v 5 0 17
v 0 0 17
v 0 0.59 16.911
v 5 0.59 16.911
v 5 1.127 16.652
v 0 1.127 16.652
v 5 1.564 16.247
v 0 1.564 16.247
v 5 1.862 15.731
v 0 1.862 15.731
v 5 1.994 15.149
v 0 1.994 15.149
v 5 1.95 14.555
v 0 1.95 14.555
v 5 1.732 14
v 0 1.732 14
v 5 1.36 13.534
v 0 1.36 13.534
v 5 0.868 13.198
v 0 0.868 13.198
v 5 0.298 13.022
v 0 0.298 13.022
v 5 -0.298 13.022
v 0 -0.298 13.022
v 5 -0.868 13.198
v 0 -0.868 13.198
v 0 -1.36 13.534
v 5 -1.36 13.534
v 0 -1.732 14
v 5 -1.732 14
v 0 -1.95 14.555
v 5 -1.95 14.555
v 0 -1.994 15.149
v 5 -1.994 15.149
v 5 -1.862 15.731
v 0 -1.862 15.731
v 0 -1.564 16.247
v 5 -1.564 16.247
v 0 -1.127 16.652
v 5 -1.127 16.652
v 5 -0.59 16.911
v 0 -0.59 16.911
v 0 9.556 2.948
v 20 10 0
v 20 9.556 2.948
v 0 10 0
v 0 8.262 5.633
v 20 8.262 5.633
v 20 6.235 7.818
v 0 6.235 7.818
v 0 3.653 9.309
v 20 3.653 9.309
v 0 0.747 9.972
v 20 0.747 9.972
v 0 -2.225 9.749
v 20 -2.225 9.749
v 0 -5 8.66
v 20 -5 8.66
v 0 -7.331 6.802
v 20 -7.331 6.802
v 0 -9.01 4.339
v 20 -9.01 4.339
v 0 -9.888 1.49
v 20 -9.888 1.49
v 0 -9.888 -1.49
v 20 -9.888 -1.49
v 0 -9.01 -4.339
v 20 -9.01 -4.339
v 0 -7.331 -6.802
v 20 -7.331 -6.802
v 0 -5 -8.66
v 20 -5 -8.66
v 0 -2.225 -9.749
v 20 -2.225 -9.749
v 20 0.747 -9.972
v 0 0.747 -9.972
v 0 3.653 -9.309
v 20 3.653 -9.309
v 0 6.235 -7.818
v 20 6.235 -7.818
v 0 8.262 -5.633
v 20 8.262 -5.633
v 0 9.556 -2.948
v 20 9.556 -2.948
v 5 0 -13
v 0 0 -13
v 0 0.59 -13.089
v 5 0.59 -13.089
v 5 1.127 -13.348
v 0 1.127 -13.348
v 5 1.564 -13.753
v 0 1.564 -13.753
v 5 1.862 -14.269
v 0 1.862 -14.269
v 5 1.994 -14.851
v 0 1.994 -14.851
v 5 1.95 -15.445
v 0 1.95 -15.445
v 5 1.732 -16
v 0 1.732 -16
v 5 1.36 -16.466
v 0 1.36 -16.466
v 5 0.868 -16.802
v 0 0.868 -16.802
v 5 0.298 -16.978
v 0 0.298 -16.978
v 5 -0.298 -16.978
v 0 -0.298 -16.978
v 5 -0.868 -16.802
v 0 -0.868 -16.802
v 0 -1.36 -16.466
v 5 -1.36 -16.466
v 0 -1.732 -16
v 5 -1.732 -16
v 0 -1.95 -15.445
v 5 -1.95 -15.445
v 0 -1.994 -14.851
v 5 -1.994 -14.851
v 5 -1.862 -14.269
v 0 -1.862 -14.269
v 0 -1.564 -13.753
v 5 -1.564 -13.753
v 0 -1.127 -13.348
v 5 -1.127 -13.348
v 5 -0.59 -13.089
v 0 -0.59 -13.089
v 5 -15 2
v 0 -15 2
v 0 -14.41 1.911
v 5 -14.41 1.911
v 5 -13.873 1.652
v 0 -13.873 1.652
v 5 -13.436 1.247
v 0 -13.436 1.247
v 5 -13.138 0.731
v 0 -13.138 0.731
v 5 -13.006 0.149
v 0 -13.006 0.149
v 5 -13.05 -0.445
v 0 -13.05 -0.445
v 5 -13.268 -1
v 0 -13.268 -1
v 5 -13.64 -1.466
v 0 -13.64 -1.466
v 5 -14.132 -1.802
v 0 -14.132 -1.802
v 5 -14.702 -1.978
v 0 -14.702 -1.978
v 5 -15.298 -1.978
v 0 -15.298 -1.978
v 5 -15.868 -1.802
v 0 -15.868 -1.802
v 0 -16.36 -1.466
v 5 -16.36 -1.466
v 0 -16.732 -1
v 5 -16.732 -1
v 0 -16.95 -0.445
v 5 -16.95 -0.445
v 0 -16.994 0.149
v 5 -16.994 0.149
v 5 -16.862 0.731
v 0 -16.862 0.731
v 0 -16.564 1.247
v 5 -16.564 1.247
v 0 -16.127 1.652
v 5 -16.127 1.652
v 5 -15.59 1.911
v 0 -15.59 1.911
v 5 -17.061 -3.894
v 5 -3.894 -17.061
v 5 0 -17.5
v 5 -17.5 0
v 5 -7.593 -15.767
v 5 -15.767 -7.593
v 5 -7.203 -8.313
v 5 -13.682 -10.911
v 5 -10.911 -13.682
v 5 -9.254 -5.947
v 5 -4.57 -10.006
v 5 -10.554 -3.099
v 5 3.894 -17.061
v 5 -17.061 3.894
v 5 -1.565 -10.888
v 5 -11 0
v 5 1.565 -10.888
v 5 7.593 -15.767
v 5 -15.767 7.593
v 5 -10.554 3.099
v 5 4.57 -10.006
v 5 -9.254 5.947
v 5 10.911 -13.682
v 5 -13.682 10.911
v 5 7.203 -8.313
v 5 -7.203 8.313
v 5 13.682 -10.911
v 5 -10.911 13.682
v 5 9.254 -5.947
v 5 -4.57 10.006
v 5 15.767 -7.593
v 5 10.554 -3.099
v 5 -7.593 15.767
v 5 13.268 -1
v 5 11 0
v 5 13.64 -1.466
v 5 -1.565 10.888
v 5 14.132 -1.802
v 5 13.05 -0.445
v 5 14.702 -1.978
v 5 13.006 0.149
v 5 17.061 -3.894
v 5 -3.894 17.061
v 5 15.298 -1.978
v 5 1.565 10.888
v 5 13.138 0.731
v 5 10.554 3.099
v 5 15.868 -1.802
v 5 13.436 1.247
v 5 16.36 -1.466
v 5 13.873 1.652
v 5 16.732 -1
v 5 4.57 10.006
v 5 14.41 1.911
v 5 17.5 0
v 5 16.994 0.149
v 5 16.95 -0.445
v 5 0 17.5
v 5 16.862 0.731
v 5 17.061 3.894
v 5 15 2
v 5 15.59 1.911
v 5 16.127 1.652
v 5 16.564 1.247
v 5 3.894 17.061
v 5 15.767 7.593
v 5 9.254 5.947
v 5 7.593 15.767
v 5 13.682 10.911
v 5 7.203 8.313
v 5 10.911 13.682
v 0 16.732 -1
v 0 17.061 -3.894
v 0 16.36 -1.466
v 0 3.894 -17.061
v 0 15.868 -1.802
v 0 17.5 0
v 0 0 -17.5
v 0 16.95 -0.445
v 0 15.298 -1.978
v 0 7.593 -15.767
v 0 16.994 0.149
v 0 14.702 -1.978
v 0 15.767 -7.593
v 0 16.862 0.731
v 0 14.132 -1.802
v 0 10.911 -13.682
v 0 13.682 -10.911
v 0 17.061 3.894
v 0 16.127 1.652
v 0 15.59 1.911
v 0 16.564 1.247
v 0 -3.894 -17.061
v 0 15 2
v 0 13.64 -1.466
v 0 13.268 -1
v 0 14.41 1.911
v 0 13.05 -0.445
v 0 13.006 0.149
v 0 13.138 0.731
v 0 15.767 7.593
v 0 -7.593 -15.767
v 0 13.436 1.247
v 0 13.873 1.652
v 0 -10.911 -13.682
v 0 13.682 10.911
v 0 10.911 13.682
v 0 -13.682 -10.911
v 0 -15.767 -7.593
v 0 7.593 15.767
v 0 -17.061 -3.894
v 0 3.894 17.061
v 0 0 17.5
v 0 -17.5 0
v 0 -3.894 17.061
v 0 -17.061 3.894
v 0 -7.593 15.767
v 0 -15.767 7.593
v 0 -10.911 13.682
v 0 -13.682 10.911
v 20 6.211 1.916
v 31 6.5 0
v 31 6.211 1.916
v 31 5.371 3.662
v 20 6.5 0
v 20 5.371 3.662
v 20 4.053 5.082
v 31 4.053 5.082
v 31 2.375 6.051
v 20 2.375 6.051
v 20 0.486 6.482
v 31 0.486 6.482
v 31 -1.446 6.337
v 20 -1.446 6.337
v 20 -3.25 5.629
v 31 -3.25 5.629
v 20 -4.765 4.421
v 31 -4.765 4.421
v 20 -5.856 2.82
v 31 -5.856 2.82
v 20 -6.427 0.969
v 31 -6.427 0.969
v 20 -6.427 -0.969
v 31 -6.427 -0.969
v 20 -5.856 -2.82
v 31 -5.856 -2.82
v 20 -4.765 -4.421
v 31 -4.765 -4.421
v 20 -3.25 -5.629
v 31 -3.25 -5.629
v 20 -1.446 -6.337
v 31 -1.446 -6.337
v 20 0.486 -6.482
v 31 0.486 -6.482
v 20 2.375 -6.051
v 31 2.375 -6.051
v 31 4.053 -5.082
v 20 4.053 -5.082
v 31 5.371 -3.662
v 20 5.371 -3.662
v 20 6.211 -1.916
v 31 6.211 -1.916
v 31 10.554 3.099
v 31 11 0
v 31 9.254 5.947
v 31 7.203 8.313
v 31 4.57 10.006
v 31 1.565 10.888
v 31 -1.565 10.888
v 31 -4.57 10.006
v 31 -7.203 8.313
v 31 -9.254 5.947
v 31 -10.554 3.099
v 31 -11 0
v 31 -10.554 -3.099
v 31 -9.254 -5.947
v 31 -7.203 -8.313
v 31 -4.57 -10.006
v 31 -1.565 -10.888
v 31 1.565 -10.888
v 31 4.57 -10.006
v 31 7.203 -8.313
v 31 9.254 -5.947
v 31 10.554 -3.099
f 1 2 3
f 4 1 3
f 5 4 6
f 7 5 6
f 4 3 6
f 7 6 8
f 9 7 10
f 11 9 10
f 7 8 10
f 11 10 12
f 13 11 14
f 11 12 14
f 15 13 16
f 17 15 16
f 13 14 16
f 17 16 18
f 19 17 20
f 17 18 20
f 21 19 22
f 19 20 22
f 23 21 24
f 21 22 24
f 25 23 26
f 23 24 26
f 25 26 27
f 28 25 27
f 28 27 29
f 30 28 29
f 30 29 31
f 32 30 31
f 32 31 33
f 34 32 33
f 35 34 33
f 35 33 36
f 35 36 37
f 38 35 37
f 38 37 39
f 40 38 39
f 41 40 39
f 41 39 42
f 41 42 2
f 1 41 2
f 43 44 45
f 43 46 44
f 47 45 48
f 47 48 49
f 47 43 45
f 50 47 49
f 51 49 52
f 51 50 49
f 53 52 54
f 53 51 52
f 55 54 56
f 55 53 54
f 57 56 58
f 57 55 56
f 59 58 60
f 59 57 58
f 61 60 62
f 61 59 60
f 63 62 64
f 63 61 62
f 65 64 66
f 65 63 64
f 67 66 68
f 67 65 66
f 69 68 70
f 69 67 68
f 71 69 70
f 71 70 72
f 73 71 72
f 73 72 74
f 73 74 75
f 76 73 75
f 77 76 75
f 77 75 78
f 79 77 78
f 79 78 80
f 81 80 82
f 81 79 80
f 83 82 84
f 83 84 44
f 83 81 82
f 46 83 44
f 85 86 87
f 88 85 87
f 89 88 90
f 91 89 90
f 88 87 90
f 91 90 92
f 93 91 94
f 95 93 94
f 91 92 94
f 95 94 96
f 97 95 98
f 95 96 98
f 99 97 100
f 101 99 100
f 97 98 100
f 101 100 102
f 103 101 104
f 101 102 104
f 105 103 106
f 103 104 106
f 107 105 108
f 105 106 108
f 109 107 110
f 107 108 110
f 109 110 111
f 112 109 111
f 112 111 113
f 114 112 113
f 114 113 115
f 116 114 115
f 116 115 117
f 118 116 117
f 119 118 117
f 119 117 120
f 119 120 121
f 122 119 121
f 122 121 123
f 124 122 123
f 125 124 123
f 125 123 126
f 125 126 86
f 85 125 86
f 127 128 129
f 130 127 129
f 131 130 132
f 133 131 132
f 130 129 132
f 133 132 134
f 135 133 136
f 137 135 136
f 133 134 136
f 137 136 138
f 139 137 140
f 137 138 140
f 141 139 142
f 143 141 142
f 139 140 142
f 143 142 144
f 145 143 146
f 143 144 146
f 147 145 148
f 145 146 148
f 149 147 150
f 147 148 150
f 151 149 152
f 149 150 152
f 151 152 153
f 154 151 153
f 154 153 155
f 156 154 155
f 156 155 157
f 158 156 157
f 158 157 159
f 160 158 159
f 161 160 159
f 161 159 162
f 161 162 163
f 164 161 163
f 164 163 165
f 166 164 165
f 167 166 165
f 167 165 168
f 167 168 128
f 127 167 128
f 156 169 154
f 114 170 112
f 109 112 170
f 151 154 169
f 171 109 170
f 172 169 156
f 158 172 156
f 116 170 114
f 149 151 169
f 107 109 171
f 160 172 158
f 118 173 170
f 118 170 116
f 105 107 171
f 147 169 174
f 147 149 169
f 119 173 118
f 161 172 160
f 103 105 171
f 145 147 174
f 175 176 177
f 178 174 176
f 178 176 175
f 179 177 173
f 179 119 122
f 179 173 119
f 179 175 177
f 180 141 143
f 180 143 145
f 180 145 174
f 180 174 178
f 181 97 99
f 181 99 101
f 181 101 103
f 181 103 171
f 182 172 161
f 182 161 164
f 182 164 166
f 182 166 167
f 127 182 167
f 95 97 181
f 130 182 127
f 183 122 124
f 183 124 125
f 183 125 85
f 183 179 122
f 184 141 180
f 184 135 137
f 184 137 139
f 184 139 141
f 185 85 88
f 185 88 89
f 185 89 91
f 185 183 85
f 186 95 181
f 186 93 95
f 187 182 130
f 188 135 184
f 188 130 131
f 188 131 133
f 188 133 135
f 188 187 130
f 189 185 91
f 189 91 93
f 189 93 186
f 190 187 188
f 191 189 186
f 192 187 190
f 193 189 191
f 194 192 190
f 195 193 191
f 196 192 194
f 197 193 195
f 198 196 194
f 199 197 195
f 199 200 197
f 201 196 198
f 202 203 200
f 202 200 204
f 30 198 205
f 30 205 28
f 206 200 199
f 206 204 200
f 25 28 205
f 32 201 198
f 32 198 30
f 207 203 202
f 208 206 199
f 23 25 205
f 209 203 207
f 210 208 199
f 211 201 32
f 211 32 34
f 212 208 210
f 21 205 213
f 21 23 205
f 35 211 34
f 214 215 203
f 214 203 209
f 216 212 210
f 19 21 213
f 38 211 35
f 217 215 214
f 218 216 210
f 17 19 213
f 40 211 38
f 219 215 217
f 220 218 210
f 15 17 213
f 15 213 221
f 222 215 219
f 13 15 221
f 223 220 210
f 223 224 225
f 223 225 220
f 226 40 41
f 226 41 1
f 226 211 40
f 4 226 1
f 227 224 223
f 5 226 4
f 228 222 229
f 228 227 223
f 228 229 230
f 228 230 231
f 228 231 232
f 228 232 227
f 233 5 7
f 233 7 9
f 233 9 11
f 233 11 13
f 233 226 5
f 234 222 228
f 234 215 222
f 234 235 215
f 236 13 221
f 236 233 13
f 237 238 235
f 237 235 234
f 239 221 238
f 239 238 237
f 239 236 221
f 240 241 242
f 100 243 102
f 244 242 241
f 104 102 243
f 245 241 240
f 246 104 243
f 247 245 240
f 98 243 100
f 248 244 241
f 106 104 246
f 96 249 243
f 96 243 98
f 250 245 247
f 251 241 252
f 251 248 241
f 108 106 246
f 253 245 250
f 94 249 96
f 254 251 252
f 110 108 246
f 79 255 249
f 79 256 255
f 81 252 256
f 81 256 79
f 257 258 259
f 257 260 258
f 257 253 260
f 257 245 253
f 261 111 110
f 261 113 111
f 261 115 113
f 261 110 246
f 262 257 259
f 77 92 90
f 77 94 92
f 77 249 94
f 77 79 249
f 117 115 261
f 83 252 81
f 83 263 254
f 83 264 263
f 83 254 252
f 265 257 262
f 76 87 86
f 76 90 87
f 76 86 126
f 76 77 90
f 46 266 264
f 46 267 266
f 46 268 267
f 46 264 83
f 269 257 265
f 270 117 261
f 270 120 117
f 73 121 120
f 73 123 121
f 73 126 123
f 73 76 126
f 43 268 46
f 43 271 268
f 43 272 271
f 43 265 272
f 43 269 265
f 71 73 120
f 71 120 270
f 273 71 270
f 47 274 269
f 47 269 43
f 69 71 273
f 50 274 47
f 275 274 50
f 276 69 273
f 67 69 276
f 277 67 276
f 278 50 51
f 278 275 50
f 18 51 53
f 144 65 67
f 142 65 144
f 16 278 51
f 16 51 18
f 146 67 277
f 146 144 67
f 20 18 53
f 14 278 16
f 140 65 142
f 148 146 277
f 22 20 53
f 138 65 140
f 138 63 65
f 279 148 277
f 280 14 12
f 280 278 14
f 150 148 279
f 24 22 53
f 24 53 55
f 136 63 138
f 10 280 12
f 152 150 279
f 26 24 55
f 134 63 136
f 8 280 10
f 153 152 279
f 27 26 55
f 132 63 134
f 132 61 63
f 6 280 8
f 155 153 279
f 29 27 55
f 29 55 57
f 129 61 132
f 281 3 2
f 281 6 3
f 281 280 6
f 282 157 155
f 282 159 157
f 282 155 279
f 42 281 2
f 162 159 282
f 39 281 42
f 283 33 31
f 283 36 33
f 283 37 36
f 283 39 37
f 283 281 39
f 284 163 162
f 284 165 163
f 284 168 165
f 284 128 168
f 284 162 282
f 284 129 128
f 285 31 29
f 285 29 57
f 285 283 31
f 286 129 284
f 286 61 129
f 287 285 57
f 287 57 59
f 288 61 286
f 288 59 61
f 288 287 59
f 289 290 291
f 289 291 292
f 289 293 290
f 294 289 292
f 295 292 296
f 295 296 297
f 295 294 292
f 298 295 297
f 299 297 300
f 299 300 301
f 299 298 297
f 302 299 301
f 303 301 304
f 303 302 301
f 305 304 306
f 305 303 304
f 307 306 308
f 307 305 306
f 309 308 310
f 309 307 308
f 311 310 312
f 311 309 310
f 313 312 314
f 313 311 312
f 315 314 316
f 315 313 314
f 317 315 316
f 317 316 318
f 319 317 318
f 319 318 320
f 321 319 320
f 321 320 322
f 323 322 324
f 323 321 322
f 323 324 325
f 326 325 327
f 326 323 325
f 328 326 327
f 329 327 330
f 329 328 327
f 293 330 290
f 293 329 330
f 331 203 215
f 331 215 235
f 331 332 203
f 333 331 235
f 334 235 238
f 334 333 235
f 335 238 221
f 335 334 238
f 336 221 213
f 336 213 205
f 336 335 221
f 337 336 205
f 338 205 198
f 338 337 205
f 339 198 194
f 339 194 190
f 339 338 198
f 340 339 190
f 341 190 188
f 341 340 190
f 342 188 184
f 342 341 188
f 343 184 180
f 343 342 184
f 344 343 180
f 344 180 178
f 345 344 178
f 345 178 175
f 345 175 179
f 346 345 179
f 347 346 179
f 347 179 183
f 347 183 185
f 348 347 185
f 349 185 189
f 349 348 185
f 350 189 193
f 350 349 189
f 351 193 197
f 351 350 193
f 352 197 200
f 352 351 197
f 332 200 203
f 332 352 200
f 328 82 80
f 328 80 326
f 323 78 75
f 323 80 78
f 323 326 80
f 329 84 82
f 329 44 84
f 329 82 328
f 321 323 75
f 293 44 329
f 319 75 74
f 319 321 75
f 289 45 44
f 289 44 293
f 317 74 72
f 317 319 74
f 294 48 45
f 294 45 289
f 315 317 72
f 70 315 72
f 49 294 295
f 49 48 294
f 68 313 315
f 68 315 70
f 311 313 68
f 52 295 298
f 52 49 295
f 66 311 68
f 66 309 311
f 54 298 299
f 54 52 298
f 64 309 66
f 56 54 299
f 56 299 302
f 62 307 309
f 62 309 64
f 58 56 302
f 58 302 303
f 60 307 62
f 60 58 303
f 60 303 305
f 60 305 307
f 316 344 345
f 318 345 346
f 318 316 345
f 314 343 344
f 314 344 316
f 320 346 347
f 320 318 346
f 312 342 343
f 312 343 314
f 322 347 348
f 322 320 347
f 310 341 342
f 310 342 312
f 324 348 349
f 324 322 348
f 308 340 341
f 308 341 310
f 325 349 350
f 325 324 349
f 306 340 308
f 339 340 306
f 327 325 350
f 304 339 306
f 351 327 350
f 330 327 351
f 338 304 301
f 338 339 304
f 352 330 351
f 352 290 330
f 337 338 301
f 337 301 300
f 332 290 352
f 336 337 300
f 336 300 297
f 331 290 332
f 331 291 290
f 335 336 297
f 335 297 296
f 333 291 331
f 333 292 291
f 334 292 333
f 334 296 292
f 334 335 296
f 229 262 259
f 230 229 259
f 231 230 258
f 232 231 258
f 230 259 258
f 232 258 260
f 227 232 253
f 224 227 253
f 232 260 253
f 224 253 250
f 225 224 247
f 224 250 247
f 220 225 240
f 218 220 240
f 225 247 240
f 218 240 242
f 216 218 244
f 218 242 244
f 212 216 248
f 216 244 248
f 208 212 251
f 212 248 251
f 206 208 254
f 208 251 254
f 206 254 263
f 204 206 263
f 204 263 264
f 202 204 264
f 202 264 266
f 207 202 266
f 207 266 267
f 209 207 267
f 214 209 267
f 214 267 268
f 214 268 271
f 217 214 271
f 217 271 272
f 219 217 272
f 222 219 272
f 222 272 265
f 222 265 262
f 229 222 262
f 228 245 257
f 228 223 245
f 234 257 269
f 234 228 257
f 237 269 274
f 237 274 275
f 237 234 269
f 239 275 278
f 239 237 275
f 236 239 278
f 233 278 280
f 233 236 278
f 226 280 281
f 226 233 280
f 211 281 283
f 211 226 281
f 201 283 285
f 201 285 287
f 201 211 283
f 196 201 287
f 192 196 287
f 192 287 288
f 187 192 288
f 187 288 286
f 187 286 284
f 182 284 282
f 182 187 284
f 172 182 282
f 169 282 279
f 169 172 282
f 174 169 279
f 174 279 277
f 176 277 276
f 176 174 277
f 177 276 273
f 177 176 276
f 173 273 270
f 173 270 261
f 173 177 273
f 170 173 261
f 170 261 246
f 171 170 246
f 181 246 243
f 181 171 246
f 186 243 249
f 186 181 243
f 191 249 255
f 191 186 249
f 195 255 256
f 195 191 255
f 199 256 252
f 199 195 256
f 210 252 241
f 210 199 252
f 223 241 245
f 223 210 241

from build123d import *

# Parameters (mm, degrees)
ESQUISSE2_R      = 2
EXTRUSION1_DEPTH = 32


with BuildPart() as part:
    # Esquisse1 → Révolution1 (revolve)
    with BuildSketch(Plane.XY):
        Polygon((0, 10), (0, 17.5), (5, 17.5), (5, 11), (31, 11), (31, 6.5), (20, 6.5), (20, 10), align=None)
    revolve(axis=Axis((0, 0, 0), (1, 0, 0)))

    # Esquisse2 → Extrusion1 (cut, through all)
    with BuildSketch(Plane.ZY):
        with Locations((0, 15)):
            Circle(ESQUISSE2_R)
        with Locations((15, 0)):
            Circle(ESQUISSE2_R)
        with Locations((0, -15)):
            Circle(ESQUISSE2_R)
        with Locations((-15, 0)):
            Circle(ESQUISSE2_R)
    extrude(amount=-EXTRUSION1_DEPTH, mode=Mode.SUBTRACT)


solid = part.part
